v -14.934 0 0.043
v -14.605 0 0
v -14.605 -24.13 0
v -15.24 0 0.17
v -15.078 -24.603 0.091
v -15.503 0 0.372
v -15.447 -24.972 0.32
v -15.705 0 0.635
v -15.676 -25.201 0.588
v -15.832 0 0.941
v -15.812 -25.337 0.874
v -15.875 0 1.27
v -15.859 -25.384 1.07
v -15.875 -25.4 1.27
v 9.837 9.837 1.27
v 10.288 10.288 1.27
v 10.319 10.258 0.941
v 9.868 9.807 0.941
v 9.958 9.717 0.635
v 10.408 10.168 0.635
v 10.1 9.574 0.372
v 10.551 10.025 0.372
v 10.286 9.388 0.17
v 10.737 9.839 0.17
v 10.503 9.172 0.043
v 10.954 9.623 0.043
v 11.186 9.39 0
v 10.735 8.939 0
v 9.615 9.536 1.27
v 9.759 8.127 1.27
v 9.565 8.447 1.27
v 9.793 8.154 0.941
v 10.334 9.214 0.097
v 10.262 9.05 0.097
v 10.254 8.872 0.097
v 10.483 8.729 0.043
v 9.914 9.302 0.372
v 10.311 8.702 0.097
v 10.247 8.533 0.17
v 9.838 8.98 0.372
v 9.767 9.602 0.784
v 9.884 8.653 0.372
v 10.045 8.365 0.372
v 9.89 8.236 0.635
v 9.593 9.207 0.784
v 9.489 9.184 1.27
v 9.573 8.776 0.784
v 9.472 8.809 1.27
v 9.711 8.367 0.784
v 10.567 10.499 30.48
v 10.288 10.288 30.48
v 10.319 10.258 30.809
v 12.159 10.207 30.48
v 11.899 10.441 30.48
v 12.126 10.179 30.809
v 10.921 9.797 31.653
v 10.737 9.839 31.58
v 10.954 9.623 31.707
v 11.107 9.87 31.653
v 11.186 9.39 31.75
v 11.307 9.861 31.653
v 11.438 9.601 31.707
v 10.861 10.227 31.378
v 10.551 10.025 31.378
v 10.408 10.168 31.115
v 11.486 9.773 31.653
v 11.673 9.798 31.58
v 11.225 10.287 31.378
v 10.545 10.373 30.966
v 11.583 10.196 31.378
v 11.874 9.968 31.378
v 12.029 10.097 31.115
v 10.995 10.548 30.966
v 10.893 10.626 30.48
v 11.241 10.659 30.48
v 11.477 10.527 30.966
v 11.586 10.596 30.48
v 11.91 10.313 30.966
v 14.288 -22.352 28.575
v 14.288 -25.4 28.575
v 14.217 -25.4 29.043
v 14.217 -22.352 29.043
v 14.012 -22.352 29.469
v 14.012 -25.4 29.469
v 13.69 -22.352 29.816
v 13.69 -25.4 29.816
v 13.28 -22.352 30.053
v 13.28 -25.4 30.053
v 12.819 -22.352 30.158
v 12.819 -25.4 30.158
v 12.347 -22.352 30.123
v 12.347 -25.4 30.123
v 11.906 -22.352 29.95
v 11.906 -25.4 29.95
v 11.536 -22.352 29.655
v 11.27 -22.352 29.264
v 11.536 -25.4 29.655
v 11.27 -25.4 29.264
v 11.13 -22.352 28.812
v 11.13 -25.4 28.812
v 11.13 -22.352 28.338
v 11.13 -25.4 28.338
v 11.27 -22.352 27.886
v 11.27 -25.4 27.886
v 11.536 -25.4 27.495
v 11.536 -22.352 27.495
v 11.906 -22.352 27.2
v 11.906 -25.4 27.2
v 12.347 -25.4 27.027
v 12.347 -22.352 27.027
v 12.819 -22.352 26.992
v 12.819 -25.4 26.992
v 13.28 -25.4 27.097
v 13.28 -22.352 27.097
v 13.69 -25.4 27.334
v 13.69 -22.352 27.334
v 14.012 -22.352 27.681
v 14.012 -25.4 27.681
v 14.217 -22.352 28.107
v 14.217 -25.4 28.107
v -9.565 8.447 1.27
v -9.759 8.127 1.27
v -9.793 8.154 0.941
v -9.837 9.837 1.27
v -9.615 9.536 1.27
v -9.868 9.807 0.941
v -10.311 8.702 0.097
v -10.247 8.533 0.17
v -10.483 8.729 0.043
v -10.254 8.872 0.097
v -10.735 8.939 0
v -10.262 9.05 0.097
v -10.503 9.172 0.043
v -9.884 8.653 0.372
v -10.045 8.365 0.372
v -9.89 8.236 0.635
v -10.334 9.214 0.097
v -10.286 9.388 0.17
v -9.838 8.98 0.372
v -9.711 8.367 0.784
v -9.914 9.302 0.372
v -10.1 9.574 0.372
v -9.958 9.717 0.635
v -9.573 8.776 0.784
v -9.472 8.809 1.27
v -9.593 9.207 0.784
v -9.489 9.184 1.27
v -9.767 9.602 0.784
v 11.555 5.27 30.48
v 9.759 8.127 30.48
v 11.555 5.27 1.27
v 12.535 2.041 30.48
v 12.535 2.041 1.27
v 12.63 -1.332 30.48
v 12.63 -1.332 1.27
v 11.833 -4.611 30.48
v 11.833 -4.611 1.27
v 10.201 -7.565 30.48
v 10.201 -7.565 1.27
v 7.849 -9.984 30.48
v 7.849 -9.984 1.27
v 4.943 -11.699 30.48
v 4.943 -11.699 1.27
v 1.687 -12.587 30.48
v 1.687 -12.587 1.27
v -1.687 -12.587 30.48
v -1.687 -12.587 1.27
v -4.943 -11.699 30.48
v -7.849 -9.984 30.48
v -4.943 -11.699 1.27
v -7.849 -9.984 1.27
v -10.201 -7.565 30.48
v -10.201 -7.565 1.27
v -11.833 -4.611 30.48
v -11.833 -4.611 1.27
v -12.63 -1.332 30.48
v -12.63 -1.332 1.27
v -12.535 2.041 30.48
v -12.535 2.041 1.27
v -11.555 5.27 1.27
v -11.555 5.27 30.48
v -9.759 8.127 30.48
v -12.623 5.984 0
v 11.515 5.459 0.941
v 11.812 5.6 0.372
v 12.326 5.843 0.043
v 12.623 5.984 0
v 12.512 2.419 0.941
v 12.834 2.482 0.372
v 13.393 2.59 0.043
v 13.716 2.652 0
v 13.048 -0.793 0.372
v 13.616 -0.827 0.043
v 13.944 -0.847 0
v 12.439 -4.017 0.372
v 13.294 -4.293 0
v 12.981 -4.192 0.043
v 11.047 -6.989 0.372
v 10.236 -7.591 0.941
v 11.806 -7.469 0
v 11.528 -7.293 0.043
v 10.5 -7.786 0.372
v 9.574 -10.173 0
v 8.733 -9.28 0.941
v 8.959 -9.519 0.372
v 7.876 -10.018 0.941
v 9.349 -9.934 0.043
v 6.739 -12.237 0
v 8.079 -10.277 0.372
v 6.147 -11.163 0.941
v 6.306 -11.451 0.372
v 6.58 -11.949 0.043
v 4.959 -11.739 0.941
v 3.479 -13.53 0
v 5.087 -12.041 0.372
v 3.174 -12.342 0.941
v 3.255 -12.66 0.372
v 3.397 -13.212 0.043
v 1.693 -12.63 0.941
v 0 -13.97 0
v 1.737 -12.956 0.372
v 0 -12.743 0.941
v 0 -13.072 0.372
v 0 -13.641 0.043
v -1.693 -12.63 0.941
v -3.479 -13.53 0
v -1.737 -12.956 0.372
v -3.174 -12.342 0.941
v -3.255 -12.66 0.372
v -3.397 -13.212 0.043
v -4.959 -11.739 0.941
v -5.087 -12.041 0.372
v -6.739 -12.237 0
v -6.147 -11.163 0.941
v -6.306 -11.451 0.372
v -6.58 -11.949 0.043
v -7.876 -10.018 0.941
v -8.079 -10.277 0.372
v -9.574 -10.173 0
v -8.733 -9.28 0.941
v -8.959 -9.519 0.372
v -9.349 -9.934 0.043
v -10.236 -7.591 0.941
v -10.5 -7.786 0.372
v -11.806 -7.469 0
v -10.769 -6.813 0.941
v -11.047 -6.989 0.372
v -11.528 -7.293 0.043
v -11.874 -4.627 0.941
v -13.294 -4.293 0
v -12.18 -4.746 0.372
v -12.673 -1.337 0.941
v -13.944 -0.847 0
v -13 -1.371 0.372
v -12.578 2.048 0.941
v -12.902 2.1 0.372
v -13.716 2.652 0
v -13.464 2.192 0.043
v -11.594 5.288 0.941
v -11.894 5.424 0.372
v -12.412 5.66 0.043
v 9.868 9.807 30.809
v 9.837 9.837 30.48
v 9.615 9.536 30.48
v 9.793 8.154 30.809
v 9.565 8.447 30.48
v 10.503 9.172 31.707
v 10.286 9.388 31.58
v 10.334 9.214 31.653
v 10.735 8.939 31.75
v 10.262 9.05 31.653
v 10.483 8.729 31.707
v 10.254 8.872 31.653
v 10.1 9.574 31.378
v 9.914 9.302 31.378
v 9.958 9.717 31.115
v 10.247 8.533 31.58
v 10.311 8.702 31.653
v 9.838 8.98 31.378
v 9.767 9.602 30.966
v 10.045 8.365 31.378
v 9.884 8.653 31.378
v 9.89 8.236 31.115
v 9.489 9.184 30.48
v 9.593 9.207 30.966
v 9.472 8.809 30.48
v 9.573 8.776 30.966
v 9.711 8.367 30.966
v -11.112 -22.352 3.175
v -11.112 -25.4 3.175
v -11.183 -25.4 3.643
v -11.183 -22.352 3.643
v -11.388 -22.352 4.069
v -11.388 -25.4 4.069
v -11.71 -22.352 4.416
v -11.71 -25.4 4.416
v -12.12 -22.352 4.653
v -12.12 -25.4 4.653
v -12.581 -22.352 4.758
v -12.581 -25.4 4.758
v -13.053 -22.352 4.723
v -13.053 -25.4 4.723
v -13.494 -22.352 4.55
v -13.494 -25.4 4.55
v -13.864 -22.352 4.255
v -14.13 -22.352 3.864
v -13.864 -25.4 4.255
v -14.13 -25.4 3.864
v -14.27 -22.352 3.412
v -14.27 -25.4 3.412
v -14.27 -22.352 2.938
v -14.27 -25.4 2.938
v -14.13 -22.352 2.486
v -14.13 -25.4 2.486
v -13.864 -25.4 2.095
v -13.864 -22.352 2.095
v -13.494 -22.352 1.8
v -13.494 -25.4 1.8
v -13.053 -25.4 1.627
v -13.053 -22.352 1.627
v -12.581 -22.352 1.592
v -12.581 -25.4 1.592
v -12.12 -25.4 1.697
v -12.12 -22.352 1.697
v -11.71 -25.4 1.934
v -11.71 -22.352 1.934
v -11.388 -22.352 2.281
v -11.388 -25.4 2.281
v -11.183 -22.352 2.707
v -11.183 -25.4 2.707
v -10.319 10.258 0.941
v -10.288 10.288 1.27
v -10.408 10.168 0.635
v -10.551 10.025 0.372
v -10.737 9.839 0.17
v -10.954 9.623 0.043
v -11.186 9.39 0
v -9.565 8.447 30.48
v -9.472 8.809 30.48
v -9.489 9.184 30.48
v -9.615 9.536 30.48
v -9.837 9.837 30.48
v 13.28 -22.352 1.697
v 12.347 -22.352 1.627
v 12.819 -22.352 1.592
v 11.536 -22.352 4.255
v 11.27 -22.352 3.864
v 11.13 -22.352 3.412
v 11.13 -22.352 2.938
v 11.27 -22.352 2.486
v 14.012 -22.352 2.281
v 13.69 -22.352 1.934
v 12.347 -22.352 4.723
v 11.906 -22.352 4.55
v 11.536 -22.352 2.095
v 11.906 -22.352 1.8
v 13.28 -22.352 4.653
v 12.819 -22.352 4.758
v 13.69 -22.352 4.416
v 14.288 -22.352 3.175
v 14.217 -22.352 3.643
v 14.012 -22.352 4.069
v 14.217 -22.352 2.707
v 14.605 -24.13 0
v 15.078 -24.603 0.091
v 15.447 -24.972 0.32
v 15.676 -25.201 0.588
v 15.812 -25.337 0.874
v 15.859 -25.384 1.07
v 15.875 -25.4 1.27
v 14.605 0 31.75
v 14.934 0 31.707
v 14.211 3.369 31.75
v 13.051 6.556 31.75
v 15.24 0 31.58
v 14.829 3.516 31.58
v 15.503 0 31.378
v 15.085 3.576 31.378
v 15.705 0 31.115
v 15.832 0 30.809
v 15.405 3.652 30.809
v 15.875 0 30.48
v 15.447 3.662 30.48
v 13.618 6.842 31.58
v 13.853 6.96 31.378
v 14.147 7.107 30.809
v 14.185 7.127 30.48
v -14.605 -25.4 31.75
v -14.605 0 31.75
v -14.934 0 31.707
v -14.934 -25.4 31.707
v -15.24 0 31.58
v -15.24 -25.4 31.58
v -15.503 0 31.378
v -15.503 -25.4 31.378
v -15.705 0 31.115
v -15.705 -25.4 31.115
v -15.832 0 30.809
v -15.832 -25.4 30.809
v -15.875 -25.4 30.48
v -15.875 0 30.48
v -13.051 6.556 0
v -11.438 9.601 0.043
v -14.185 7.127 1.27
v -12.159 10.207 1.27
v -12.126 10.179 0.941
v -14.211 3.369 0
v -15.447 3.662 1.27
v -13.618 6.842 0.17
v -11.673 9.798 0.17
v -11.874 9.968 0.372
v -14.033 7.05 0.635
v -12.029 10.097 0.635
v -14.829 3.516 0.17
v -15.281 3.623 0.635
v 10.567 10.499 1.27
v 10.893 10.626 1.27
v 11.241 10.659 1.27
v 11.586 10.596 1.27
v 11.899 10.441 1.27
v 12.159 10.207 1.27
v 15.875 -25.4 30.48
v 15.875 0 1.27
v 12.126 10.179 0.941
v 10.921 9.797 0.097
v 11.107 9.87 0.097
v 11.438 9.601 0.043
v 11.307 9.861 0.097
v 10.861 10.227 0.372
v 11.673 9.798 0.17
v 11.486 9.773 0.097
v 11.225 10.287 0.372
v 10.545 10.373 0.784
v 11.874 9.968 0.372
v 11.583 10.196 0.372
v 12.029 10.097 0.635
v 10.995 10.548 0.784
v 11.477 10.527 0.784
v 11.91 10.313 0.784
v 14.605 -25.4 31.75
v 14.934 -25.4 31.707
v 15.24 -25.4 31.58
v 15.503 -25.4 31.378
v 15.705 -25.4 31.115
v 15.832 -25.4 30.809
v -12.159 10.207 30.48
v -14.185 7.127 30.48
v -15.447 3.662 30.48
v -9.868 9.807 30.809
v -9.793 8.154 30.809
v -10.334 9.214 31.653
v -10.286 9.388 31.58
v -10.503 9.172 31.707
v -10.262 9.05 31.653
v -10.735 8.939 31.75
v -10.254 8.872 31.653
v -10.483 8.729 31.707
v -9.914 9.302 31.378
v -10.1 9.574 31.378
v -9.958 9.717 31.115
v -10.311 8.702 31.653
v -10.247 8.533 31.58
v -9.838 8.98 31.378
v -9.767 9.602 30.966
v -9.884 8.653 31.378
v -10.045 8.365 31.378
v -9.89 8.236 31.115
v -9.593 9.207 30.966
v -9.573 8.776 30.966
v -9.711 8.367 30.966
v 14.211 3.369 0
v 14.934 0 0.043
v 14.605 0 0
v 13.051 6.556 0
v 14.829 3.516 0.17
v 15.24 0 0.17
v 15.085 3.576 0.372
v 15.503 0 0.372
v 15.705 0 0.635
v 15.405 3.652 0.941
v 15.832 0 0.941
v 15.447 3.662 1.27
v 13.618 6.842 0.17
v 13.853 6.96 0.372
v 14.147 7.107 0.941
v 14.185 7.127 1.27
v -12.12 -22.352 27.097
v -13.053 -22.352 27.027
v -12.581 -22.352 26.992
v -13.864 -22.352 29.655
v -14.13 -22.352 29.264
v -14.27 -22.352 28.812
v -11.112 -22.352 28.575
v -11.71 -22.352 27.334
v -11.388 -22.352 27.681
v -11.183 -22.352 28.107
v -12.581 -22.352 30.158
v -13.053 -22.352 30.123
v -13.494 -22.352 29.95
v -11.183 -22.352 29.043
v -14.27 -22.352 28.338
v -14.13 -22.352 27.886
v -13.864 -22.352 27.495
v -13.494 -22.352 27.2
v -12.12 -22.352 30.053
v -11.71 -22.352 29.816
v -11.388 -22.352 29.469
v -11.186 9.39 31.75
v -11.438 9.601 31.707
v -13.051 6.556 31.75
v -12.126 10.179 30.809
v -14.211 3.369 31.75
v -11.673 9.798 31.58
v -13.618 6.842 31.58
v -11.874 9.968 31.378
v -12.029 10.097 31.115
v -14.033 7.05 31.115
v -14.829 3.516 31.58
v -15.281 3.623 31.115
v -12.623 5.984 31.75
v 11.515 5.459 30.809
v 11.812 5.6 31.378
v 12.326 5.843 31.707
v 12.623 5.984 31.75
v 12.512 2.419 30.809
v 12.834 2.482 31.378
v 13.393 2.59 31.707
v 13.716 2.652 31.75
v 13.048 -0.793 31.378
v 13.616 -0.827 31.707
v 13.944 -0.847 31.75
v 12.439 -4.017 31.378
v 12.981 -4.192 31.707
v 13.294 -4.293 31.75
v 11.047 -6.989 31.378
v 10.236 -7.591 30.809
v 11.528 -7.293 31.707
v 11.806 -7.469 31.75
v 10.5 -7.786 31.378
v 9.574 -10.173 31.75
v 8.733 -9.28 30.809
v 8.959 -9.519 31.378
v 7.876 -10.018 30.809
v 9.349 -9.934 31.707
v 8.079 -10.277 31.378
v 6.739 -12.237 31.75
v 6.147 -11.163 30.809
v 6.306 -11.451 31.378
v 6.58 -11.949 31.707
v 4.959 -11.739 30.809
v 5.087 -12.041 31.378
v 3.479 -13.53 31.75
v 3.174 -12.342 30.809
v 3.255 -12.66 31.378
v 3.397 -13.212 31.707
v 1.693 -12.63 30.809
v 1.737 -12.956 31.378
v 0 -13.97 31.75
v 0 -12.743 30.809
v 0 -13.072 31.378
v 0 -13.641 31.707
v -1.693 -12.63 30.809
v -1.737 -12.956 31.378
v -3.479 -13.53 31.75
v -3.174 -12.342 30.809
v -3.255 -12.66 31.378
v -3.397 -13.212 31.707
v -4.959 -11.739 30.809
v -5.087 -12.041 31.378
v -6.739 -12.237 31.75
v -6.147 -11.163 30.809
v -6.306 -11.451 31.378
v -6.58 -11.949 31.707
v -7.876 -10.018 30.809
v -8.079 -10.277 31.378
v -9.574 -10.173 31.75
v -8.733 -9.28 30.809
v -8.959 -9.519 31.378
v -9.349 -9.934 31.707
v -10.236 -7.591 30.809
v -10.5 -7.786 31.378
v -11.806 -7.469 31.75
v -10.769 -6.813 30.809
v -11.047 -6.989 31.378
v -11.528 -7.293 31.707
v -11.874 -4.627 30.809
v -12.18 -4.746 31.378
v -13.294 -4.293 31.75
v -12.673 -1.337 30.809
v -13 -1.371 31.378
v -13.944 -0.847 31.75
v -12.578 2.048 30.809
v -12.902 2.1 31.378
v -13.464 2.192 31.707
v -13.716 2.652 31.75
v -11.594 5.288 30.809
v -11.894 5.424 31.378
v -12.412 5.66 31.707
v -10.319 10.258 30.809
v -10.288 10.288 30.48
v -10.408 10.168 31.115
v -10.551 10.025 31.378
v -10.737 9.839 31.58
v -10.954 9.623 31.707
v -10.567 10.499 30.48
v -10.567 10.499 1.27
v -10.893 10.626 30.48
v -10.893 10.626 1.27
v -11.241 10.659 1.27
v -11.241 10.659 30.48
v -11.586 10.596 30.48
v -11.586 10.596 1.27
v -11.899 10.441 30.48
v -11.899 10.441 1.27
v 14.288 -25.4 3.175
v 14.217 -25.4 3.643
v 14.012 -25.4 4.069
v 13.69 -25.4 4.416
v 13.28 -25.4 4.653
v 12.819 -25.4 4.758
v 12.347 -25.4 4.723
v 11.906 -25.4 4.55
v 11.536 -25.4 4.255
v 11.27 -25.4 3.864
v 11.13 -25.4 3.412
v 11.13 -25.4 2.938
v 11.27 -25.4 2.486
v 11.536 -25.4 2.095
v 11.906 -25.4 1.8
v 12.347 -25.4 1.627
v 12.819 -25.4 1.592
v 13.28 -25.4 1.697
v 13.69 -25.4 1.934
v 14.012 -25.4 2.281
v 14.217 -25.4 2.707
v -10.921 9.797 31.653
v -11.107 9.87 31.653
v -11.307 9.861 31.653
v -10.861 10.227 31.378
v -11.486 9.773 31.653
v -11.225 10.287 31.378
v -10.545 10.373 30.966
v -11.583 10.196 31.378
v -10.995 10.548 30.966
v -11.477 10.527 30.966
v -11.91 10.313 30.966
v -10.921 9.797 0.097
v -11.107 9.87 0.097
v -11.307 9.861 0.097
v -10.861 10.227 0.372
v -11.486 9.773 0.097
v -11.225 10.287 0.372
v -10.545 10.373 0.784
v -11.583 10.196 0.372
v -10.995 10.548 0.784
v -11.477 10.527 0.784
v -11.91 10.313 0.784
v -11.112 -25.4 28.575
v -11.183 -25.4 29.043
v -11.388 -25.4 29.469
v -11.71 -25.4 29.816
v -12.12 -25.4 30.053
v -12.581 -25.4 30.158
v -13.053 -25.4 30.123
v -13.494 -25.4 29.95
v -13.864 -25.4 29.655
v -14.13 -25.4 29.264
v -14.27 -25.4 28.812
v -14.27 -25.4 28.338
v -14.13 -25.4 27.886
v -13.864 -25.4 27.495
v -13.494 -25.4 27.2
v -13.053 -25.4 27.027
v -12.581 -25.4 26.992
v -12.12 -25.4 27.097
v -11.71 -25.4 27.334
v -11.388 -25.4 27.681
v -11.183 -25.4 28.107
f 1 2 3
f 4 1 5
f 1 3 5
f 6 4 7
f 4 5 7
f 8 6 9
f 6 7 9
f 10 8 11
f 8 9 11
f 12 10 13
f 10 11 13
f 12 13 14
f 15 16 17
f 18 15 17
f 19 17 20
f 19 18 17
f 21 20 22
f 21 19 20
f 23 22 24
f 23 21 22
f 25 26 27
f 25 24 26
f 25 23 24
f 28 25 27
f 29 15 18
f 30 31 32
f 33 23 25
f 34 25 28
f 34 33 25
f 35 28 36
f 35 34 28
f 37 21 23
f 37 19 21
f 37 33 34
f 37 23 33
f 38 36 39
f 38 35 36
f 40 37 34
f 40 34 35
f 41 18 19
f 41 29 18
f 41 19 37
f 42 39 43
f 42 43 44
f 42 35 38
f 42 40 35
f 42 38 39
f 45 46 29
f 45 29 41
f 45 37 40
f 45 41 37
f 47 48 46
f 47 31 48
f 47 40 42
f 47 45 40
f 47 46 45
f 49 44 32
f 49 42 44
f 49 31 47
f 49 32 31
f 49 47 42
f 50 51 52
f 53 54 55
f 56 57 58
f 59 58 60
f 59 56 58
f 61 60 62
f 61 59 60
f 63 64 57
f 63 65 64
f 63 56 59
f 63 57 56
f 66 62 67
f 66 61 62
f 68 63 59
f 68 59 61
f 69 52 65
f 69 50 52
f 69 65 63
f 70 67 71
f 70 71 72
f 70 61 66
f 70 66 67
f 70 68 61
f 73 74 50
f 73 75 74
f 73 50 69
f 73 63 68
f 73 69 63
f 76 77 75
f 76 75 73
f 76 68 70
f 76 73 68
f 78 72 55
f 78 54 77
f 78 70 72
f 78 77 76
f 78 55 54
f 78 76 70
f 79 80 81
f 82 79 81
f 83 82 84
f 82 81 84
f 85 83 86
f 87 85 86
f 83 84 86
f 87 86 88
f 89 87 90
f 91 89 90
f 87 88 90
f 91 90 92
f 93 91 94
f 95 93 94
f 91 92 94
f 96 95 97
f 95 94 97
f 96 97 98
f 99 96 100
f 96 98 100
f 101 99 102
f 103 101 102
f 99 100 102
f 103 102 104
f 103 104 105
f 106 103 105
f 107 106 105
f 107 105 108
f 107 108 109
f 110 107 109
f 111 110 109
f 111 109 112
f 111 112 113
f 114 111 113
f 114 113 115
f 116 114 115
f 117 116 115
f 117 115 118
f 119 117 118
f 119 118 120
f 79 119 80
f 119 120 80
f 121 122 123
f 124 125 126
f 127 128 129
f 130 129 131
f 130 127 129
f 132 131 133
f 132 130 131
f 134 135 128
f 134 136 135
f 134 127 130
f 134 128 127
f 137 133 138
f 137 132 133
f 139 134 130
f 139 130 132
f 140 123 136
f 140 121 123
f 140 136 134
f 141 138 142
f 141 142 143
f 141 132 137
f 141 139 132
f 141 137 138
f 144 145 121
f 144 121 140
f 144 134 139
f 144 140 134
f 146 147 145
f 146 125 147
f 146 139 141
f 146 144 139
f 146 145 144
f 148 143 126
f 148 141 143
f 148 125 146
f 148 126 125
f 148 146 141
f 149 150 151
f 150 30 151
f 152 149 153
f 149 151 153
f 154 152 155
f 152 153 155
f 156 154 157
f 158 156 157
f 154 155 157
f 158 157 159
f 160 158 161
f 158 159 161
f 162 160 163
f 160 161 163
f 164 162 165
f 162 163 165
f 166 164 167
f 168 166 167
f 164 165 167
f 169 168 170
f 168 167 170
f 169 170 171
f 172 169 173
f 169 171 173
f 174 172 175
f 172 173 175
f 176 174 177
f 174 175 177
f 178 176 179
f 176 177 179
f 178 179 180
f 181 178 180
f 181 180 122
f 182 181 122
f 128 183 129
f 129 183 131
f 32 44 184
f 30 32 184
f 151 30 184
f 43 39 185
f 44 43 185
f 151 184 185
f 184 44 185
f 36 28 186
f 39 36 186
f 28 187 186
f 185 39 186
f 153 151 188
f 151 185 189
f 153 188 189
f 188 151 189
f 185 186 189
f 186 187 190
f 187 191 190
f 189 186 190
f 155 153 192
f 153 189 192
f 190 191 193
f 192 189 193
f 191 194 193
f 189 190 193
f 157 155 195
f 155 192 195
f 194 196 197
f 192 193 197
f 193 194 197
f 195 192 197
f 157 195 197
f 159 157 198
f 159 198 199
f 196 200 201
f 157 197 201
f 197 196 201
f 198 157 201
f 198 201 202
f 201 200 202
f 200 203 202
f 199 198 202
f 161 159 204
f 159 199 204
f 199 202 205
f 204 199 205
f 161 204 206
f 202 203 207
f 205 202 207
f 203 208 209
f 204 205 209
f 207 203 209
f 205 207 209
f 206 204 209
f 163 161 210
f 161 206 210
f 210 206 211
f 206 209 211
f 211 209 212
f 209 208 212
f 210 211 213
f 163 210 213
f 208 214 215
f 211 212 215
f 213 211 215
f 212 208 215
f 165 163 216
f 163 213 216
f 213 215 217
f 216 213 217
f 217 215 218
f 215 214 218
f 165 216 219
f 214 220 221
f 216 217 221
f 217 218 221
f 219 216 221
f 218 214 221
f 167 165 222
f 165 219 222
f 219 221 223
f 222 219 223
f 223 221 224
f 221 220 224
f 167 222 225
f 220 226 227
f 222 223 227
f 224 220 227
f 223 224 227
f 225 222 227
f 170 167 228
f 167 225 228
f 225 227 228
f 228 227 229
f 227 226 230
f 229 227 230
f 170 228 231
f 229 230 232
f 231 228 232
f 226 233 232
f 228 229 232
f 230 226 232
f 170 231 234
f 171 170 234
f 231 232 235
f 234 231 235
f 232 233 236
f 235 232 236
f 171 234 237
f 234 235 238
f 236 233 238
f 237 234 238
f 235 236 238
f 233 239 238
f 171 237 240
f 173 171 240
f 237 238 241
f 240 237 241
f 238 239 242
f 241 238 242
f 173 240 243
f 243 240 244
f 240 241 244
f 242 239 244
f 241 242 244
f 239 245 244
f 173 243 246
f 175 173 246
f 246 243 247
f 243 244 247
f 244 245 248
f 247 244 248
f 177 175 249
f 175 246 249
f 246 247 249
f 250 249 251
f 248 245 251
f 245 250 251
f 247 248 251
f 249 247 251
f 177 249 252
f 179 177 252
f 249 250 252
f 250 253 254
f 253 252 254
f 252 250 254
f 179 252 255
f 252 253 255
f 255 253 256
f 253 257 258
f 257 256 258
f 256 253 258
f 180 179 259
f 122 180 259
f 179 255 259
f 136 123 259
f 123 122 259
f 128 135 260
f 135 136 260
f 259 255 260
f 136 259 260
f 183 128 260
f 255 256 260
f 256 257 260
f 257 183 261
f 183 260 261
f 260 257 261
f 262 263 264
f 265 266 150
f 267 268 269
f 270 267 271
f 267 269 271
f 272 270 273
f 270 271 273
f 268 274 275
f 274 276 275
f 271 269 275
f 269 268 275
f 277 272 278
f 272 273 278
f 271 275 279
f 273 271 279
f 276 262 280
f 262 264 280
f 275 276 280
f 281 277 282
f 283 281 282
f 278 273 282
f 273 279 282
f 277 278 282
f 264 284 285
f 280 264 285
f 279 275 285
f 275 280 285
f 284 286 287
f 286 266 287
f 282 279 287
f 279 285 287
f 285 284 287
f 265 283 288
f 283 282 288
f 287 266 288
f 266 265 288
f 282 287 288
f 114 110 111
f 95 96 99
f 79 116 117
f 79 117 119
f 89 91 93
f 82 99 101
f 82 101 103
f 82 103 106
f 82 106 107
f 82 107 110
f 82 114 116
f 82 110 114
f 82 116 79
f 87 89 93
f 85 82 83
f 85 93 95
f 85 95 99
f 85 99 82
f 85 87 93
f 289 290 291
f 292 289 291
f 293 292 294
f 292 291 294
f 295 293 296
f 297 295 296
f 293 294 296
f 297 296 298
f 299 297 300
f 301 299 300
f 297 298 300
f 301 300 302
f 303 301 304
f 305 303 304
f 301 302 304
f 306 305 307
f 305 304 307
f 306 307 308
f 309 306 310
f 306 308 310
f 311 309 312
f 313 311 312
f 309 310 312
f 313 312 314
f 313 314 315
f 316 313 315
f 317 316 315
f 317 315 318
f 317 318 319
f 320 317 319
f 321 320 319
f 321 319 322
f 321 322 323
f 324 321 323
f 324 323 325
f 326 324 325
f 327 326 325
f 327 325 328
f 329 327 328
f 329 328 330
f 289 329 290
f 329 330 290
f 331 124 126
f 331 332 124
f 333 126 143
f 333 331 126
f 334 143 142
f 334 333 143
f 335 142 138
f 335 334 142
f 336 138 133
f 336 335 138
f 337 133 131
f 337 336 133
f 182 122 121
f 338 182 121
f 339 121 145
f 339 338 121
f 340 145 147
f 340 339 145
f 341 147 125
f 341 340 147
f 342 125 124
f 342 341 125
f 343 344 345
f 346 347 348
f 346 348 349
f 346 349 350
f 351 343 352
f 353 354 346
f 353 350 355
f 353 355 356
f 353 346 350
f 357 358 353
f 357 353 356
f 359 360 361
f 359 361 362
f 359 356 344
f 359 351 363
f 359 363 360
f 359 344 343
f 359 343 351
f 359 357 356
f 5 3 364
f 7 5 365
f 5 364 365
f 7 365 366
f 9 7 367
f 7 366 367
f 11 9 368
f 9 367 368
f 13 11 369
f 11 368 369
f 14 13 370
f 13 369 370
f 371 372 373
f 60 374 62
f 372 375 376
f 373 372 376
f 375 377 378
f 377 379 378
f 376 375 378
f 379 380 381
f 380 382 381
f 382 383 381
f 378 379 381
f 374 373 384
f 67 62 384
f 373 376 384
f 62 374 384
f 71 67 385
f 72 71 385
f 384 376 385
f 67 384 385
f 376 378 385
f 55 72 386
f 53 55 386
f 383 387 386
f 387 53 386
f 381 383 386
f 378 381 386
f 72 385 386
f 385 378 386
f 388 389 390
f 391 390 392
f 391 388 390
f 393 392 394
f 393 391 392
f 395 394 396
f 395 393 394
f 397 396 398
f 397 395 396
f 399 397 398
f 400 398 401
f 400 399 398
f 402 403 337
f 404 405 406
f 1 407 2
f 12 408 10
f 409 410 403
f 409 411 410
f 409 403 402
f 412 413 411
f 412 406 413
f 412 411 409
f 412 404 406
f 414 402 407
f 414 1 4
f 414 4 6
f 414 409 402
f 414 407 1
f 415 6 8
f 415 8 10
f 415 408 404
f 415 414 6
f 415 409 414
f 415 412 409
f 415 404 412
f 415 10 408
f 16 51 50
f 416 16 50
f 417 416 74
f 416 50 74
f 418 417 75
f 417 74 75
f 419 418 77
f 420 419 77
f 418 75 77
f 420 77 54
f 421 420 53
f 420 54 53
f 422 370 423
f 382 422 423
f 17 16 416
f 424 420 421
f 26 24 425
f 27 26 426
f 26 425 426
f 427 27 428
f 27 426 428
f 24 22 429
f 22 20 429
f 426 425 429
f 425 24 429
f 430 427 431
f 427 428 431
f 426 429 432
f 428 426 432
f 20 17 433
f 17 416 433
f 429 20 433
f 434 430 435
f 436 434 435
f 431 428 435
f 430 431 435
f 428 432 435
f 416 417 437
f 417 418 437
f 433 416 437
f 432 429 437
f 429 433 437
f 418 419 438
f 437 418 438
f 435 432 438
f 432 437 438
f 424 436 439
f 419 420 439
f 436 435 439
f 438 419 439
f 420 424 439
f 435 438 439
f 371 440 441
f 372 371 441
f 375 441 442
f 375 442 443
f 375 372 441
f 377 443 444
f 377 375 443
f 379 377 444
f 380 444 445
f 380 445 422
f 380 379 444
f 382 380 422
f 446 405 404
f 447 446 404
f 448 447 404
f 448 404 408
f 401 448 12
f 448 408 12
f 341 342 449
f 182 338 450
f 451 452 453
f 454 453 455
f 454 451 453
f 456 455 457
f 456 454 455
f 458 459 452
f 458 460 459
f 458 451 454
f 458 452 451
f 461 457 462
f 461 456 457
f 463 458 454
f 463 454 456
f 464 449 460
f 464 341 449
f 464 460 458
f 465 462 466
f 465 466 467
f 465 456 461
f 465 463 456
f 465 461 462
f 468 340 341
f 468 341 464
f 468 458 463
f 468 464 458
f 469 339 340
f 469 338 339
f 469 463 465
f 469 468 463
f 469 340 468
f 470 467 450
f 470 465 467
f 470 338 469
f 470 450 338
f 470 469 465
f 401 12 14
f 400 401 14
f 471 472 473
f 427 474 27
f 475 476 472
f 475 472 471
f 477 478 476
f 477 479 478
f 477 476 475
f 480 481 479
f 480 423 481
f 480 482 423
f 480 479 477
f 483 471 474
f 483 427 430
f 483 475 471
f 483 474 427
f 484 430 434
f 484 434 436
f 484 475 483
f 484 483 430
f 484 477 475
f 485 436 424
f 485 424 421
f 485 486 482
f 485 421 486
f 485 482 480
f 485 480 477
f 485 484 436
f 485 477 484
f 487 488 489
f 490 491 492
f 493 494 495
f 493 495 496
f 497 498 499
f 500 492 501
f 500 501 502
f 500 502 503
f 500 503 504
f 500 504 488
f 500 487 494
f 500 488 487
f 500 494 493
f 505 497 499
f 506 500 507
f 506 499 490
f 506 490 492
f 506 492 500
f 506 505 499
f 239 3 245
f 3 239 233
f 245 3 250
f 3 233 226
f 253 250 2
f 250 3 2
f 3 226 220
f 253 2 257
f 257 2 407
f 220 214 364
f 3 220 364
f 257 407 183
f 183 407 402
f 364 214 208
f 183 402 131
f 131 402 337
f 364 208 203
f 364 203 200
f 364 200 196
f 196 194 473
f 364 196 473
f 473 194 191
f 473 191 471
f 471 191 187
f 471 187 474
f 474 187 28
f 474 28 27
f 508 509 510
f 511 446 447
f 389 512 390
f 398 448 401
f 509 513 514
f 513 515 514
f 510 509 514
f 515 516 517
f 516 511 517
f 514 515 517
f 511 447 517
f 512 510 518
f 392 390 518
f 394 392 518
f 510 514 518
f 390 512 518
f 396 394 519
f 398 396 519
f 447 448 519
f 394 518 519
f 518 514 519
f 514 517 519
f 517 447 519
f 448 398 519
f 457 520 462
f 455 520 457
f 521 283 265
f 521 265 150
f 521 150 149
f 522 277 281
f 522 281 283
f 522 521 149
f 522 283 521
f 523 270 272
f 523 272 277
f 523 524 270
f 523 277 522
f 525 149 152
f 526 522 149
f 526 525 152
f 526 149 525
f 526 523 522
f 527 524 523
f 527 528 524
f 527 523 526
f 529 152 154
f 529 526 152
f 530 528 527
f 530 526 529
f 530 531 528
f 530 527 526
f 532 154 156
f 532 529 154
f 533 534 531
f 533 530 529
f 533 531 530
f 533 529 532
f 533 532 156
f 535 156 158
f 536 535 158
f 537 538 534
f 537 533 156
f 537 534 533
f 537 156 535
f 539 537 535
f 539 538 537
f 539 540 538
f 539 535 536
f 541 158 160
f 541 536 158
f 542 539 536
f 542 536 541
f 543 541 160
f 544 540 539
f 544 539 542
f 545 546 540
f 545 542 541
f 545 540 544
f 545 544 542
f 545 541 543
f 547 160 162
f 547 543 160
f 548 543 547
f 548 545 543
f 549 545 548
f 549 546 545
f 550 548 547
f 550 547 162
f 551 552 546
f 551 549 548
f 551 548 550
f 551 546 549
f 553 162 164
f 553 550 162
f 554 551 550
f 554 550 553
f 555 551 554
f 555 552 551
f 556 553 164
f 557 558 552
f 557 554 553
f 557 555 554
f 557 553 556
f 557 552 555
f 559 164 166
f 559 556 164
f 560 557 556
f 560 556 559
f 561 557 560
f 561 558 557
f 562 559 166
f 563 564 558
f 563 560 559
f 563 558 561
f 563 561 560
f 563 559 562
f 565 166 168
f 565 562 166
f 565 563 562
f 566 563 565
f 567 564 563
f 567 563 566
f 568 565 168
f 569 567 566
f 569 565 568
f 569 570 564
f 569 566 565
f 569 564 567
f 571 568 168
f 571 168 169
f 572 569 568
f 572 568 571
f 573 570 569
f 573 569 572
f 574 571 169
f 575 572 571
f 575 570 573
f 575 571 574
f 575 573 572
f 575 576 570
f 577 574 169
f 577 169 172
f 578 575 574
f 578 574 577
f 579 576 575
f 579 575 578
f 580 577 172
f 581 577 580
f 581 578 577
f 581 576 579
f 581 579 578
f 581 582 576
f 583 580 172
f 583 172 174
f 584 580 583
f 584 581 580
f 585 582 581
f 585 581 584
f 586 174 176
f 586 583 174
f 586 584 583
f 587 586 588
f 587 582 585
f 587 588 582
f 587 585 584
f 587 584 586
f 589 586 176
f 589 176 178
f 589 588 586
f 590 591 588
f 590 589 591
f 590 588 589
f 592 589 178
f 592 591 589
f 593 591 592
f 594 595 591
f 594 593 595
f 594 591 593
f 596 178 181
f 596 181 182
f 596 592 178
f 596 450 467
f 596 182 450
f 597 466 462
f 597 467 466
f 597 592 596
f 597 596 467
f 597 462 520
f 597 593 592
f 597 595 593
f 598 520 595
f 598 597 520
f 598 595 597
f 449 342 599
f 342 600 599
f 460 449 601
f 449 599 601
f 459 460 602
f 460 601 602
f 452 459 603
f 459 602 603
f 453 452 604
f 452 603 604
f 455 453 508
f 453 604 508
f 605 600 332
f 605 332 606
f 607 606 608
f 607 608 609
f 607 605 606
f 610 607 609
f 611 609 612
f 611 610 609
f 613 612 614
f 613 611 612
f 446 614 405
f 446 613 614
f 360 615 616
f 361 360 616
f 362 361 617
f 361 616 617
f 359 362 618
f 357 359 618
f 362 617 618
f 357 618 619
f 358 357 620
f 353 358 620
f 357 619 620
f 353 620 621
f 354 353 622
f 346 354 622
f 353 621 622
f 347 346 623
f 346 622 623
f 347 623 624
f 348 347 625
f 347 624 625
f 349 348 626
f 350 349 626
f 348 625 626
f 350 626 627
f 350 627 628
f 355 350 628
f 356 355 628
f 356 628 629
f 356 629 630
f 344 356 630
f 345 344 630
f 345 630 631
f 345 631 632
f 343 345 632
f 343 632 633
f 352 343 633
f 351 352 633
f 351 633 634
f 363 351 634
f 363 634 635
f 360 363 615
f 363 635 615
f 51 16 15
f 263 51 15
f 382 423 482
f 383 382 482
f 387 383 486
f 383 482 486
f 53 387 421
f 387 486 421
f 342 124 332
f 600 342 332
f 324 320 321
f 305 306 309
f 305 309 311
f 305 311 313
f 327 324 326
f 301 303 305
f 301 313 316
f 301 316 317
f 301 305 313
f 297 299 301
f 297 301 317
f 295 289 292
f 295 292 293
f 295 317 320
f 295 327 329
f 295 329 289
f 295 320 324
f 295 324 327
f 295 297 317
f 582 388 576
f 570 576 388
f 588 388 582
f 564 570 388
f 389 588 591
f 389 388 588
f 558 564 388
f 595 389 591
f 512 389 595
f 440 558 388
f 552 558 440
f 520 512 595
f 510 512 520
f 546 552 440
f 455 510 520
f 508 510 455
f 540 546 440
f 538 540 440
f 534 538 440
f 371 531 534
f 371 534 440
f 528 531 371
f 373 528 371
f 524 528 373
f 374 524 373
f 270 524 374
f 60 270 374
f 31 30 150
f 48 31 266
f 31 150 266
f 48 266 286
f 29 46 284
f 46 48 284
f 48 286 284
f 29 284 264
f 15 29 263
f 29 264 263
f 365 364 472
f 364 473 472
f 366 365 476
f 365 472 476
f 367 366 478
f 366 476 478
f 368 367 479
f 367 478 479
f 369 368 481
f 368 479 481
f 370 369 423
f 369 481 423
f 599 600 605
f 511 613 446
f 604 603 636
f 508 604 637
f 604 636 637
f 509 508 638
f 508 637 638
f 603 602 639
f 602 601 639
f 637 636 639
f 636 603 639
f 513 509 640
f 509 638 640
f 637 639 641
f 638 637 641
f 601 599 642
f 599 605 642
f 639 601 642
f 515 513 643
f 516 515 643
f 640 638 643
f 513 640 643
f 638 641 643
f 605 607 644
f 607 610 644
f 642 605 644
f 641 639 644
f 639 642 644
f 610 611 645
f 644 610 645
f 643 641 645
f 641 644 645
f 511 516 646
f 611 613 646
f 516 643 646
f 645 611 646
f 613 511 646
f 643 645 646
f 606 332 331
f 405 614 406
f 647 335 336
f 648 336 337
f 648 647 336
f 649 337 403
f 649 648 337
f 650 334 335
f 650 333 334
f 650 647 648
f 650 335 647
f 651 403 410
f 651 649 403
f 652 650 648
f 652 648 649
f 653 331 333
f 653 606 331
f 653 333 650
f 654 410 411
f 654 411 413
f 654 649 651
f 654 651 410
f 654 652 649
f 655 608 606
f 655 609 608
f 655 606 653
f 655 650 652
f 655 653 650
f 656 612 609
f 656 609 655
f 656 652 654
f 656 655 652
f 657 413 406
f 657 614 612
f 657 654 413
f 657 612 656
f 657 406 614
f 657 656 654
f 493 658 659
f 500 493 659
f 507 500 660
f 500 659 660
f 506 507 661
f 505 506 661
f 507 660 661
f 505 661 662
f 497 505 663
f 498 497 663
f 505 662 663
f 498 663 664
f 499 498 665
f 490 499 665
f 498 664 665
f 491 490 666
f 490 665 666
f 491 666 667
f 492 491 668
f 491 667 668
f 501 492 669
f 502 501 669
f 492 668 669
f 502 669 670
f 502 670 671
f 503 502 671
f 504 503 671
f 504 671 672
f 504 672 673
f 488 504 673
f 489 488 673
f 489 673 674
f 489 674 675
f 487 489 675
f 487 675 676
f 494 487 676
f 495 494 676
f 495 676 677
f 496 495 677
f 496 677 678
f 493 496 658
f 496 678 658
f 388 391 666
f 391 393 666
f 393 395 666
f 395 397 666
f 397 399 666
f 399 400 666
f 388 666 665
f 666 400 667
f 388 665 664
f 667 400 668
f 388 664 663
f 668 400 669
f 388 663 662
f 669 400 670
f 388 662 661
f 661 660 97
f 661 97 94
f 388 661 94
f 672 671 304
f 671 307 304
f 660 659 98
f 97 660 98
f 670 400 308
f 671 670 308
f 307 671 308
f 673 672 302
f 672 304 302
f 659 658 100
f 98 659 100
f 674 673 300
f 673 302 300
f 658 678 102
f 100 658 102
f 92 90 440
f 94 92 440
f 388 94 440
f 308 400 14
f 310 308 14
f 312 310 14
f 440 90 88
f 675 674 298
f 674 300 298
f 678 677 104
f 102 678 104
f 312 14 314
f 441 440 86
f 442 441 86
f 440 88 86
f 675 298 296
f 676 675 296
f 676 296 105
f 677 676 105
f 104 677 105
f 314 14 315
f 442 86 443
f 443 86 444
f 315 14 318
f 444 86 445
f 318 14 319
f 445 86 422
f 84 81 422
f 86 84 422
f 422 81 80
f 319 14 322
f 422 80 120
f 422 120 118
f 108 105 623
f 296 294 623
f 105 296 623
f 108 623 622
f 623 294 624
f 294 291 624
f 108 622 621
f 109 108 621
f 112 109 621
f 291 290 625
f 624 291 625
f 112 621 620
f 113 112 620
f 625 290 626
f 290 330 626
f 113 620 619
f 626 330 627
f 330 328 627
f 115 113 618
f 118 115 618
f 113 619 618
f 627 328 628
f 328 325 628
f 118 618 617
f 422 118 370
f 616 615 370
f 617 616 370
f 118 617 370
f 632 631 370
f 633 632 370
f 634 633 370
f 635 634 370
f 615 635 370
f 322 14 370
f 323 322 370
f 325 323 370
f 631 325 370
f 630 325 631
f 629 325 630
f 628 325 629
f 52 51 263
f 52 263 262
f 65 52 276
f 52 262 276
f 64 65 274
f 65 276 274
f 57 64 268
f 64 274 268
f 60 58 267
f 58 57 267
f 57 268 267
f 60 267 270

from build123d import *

# Parameters (mm, degrees)
F1_DEPTH = 31.75
F2_R     = 1.5875
F3_DEPTH = 3.048
F4_R     = 1.27


with BuildPart() as f1:
    # F0 (on Top) → F1 (new body)
    with BuildSketch(Plane.XY):
        with BuildLine():
            ThreePointArc((8.980256, 8.980256), (0, -12.7), (-8.980256, 8.980256))
            Line((-8.980256, 8.980256), (-11.22532, 11.22532))
            ThreePointArc((-11.22532, 11.22532), (-14.666588, 6.075099), (-15.875, 0))
            Line((-15.875, 0), (-15.875, -25.4))
            Line((-15.875, -25.4), (15.875, -25.4))
            Line((15.875, -25.4), (15.875, 0))
            ThreePointArc((15.875, 0), (14.666588, 6.075099), (11.22532, 11.22532))
            Line((11.22532, 11.22532), (8.980256, 8.980256))
        make_face()
    extrude(amount=F1_DEPTH)

    # F2 (on face) → F3 (cut)
    with BuildSketch(Plane.XZ.offset(25.4)):
        with Locations((-12.7, 28.575)):
            Circle(F2_R)
        with Locations((12.7, 28.575)):
            Circle(F2_R)
        with Locations((12.7, 3.175)):
            Circle(F2_R)
        with Locations((-12.7, 3.175)):
            Circle(F2_R)
    extrude(amount=-F3_DEPTH, mode=Mode.SUBTRACT)

    # F4
    f4_edges = [f1.edges().sort_by_distance(p)[0] for p in [
        (-15.875, -12.7, 31.75),
        (0, -12.7, 31.75),
        (15.875, -12.7, 31.75),
        (10.102788, 10.102788, 0),
        (0, -12.7, 0),
        (-10.102788, 10.102788, 0),
        (-14.666588, 6.075099, 0),
        (-15.875, -12.7, 0),
        (0, -25.4, 0),
        (15.875, -12.7, 0),
        (14.666588, 6.075099, 0),
        (-8.980256, 8.980256, 15.875),
        (-11.22532, 11.22532, 15.875),
        (-10.102788, 10.102788, 31.75),
        (11.22532, 11.22532, 15.875),
        (8.980256, 8.980256, 15.875),
        (10.102788, 10.102788, 31.75),
    ]]
    fillet(f4_edges, radius=F4_R)


solid = f1.part
